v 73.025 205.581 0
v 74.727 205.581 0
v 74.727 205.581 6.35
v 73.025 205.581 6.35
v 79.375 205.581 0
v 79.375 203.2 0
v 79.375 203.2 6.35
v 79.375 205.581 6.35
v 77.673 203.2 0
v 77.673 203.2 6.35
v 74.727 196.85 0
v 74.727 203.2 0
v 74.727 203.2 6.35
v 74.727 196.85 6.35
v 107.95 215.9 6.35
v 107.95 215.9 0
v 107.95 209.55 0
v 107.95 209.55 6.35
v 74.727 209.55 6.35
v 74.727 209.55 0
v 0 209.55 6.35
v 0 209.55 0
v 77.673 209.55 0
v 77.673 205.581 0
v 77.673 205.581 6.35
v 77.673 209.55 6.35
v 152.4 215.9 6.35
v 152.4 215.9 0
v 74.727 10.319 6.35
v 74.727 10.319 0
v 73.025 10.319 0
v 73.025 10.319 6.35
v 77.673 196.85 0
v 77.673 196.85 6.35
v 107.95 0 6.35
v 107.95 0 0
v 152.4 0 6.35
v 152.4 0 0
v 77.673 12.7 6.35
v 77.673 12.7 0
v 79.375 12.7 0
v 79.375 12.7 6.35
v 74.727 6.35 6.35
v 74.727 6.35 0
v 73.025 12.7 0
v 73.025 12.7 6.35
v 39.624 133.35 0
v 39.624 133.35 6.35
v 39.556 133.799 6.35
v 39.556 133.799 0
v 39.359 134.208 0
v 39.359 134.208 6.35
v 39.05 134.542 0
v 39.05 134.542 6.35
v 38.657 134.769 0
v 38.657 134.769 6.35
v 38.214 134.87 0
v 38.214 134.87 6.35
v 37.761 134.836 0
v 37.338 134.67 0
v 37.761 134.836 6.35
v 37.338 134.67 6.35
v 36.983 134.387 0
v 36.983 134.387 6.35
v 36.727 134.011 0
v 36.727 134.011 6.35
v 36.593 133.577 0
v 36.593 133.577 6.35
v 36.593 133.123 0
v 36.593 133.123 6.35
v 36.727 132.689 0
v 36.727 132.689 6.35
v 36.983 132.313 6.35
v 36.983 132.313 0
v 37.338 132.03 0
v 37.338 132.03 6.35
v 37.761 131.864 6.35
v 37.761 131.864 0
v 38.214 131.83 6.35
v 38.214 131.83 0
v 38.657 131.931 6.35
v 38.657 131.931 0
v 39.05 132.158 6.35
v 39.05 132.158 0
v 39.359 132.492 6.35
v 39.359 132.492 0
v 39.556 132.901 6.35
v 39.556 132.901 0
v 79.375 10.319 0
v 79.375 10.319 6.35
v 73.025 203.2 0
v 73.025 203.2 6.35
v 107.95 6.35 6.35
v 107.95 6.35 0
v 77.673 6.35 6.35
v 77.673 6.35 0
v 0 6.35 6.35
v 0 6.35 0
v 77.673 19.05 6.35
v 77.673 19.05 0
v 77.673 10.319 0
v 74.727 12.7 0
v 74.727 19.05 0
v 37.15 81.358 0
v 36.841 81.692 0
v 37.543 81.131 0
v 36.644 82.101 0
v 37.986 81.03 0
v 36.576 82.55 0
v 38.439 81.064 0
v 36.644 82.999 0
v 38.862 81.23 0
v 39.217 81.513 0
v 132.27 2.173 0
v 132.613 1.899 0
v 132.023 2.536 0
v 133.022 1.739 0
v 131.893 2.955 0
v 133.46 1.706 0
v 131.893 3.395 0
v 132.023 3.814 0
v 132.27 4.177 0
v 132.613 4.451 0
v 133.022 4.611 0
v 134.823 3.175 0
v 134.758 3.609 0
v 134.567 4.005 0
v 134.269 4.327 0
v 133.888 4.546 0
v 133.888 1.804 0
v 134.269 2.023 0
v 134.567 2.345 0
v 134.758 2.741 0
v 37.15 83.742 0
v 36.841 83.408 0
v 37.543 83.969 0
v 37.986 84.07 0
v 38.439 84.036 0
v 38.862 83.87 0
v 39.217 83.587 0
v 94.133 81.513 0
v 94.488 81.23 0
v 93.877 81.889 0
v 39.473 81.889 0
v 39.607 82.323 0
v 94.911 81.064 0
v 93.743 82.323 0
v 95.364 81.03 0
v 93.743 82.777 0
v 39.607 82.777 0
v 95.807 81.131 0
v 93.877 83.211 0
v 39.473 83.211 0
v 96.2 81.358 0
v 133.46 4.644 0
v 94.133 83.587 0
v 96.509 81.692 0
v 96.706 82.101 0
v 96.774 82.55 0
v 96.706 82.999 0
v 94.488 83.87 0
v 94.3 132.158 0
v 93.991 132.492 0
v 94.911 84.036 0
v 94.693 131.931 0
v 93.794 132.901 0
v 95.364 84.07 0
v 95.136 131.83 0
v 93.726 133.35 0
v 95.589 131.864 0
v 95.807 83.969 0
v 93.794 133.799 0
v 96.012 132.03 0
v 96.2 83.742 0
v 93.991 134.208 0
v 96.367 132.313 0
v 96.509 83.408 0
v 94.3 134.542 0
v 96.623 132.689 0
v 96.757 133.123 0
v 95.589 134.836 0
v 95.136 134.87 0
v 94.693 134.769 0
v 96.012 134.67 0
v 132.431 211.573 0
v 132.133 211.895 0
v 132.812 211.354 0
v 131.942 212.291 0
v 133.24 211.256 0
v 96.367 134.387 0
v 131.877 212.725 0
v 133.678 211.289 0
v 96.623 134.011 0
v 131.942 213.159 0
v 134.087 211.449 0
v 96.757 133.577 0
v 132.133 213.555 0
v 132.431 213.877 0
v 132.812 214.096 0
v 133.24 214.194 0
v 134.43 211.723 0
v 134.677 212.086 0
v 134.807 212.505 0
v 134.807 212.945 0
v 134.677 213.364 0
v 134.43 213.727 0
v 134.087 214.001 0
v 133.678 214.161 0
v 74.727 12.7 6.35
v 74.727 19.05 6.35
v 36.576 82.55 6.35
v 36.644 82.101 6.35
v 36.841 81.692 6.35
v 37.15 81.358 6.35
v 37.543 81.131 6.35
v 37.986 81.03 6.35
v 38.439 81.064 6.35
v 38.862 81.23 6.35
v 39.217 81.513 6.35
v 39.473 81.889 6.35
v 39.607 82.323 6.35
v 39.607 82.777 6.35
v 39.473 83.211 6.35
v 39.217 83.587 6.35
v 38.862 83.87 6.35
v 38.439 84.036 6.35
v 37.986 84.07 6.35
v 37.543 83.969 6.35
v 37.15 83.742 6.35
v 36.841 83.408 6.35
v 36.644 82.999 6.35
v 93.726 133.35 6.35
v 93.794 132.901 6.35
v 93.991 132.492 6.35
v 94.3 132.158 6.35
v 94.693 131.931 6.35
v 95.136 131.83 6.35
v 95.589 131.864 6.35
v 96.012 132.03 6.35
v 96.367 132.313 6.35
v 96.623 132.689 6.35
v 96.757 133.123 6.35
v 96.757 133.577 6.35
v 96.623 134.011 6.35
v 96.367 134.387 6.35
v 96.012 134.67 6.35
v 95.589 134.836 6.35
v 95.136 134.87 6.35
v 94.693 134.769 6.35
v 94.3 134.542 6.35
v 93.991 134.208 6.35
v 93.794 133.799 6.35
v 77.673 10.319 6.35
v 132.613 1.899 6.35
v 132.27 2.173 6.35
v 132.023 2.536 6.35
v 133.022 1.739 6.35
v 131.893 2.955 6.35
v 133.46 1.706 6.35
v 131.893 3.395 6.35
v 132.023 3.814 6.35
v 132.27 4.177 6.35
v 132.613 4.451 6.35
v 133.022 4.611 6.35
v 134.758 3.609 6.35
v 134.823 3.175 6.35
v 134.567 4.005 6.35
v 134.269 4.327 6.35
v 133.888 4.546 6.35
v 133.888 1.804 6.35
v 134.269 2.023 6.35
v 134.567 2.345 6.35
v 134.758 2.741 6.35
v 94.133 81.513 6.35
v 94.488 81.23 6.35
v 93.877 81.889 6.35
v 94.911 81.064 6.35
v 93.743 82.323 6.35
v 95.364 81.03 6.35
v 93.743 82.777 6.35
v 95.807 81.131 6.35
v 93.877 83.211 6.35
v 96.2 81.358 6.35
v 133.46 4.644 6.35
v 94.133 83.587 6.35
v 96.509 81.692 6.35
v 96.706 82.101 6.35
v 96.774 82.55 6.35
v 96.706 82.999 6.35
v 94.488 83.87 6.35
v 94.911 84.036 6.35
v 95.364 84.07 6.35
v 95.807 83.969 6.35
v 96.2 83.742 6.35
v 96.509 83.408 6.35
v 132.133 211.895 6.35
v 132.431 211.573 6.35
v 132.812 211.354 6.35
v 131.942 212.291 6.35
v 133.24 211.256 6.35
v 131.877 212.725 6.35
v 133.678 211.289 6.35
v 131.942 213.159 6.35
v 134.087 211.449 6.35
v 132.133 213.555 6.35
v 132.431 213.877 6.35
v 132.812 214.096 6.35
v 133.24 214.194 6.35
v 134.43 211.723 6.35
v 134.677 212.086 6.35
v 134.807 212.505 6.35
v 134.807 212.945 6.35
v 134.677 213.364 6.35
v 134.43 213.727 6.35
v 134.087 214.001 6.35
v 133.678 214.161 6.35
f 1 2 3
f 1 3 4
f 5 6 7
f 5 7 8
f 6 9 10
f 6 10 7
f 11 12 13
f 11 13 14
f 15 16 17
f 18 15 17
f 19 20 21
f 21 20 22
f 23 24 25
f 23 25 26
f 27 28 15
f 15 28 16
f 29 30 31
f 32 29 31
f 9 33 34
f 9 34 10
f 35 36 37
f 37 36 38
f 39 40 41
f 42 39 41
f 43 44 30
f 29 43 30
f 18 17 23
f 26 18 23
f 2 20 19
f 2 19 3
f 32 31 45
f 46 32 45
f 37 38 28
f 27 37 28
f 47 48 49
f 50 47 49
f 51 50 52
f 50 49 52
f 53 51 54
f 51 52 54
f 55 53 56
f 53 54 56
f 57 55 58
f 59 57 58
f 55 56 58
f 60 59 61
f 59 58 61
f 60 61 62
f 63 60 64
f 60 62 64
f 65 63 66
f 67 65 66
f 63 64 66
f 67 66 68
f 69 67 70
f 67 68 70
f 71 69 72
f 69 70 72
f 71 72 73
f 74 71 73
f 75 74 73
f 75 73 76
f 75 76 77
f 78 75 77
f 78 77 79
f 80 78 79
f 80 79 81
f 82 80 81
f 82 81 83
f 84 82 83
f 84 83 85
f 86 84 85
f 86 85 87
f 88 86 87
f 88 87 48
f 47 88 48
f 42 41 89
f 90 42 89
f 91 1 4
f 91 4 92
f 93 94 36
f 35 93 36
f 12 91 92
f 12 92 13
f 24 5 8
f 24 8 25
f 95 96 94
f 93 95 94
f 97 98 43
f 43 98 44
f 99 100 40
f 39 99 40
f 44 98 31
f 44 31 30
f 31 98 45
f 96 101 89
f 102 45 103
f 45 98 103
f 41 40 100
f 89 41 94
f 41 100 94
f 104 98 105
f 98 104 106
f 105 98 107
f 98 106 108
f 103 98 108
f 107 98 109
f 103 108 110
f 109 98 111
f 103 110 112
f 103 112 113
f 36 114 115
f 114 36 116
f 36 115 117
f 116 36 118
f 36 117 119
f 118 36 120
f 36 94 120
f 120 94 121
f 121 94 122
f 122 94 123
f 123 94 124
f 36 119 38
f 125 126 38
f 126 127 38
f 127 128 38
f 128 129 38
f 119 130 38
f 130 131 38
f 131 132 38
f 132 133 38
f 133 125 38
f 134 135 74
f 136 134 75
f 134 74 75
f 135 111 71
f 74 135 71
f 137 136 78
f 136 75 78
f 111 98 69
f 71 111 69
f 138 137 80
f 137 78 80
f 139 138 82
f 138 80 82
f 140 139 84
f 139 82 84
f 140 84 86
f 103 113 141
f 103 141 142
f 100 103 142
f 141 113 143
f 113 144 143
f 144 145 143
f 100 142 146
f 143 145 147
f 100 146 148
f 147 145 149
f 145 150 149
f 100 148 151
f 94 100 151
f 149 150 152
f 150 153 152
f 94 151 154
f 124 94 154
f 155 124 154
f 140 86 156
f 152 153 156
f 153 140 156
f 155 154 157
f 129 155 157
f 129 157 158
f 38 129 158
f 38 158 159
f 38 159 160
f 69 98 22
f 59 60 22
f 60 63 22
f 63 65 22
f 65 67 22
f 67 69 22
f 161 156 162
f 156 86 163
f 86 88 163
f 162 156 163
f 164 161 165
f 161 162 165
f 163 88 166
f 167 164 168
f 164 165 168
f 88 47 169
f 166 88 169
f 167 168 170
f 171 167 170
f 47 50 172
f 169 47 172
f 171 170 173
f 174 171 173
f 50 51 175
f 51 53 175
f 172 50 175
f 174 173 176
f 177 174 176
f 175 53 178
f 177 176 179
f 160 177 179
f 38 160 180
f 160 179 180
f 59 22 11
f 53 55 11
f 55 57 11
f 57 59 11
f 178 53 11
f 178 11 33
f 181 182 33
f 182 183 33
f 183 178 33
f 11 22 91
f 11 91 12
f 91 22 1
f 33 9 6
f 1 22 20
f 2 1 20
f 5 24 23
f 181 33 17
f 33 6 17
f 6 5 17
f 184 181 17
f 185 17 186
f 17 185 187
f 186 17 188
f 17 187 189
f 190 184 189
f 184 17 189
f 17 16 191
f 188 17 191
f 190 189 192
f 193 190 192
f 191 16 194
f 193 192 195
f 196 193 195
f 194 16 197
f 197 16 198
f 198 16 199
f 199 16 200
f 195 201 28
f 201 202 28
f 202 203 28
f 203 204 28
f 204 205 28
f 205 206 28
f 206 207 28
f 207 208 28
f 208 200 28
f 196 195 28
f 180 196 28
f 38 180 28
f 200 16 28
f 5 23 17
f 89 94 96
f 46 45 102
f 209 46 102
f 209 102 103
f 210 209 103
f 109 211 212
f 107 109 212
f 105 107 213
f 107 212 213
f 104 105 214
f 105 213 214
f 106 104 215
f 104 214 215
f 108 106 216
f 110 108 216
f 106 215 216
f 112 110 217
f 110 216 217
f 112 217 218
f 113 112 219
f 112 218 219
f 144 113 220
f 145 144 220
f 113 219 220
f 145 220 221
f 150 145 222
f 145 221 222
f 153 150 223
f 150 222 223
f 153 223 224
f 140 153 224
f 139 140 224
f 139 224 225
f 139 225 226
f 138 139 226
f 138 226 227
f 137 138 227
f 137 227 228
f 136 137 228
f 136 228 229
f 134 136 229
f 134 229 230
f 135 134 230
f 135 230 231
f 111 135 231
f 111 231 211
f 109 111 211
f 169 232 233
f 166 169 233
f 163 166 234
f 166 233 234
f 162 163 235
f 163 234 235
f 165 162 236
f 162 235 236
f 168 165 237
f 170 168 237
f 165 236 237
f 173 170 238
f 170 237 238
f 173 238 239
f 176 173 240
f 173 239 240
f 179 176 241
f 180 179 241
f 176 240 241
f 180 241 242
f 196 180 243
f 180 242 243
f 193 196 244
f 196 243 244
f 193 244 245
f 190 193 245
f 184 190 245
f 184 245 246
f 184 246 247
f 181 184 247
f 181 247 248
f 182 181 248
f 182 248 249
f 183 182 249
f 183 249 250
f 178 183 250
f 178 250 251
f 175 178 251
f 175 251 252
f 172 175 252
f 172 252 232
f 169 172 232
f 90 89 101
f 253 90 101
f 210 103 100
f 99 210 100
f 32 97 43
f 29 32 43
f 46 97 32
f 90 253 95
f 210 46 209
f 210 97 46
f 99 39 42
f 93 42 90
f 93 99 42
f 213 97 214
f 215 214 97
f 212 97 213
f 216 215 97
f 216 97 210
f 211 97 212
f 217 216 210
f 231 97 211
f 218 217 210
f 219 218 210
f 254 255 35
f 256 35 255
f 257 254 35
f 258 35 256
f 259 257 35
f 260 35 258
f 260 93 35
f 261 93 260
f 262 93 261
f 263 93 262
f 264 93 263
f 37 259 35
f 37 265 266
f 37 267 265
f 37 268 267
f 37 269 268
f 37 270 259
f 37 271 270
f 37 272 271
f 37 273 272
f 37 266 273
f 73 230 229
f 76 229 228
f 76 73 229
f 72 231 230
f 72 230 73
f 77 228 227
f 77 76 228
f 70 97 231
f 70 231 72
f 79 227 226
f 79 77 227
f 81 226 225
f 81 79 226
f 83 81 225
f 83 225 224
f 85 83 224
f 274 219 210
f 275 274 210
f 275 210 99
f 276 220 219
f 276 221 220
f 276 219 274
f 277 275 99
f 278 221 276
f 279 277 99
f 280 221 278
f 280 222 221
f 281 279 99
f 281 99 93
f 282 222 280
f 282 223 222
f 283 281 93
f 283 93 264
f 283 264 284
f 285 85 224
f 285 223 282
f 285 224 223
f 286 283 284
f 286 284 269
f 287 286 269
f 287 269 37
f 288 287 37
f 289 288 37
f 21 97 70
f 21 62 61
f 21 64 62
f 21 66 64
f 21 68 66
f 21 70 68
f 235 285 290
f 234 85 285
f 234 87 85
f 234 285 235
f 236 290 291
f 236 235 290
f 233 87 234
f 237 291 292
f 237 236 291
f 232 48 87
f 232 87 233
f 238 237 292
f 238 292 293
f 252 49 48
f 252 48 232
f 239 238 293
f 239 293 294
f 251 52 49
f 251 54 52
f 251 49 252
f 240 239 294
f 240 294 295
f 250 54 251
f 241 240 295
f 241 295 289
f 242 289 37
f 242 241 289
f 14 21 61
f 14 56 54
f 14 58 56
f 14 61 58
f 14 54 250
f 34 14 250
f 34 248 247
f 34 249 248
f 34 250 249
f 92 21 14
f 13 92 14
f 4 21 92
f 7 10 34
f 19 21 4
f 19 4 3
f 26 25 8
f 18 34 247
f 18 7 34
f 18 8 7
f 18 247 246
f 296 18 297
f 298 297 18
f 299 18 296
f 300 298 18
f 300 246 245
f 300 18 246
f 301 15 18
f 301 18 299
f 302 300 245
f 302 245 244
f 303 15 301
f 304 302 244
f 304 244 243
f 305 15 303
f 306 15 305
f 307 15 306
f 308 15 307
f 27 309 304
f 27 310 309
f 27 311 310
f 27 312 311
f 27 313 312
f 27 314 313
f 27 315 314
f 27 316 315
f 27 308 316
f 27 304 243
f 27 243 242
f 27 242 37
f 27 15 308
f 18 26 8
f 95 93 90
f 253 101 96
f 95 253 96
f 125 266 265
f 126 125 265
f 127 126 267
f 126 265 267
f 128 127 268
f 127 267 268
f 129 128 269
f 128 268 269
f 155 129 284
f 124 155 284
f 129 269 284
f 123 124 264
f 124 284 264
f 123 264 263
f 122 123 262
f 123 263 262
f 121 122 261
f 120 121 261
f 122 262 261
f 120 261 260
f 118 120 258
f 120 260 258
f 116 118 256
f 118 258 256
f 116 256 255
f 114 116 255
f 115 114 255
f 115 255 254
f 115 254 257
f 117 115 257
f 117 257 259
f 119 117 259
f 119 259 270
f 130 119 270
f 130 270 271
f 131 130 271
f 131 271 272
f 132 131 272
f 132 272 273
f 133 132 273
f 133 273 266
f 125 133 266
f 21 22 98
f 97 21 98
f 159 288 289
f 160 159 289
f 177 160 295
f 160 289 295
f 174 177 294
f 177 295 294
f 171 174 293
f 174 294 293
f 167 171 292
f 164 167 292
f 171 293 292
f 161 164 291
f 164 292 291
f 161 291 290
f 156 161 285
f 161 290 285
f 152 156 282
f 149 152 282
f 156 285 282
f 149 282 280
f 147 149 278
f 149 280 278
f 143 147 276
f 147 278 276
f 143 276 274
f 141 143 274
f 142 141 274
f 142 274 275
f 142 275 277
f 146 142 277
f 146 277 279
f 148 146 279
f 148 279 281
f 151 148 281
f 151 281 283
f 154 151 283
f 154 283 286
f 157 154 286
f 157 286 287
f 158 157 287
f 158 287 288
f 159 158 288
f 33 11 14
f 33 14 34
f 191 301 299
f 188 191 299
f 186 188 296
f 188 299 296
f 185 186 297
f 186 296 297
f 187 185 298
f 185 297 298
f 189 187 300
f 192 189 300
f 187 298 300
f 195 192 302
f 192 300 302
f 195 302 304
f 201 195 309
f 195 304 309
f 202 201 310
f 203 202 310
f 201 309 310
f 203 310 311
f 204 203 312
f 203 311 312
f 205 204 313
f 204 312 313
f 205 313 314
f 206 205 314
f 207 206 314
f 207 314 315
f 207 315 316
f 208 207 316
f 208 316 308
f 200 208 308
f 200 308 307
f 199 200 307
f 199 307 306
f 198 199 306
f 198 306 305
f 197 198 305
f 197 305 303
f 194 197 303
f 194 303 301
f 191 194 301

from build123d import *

# Parameters (mm, degrees)
BOSS_EXTRUDE1_DEPTH = 6.35
SKETCH2_R           = 1.4732
CUT_EXTRUDE1_DEPTH  = 265.346160366
SKETCH4_R           = 1.524
CUT_EXTRUDE2_DEPTH  = 265.346160366
SKETCH5_R           = 1.524
CUT_EXTRUDE3_DEPTH  = 265.346160366
CUT_EXTRUDE10_DEPTH = 265.346160366


with BuildPart() as part:
    # Sketch1 → Boss-Extrude1 (new body)
    with BuildSketch(Plane.XY):
        Polygon((107.95, 215.9), (107.95, 209.55), (0, 209.55), (0, 6.35), (107.95, 6.35), (107.95, 0), (152.4, 0), (152.4, 215.9), align=None)
    extrude(amount=BOSS_EXTRUDE1_DEPTH)

    # Sketch2 → Cut-Extrude1 (cut, through all)
    with BuildSketch(Plane.XY.offset(6.35)):
        with Locations(Location((133.35, 212.725, 0), (0, 0, 180))):
            Circle(SKETCH2_R)
        with Locations((133.35, 3.175)):
            Circle(SKETCH2_R)
    extrude(amount=-CUT_EXTRUDE1_DEPTH, mode=Mode.SUBTRACT)

    # Sketch4 → Cut-Extrude2 (cut, through all)
    with BuildSketch(Plane.XY.offset(6.35)):
        with Locations(Location((95.25, 133.35, 0), (0, 0, 180))):
            Circle(SKETCH4_R)
        with Locations((95.25, 82.55)):
            Circle(SKETCH4_R)
    extrude(amount=-CUT_EXTRUDE2_DEPTH, mode=Mode.SUBTRACT)

    # Sketch5 → Cut-Extrude3 (cut, through all)
    with BuildSketch(Plane.XY.offset(6.35)):
        with Locations((38.1, 133.35)):
            Circle(SKETCH5_R)
        with Locations(Location((38.1, 82.55, 0), (0, 0, 180))):
            Circle(SKETCH5_R)
    extrude(amount=-CUT_EXTRUDE3_DEPTH, mode=Mode.SUBTRACT)

    # Sketch10 → Cut-Extrude10 (cut, through all)
    with BuildSketch(Plane(origin=(0, 0, 0), x_dir=(-1, 0, 0), z_dir=(0, 0, -1))):
        Polygon((-77.6732, 6.35), (-74.7268, 6.35), (-74.7268, 10.31875), (-73.025, 10.31875), (-73.025, 12.7), (-74.7268, 12.7), (-74.7268, 19.05), (-77.6732, 19.05), (-77.6732, 12.7), (-79.375, 12.7), (-79.375, 10.31875), (-77.6732, 10.31875), align=None)
        Polygon((-73.025, 205.58125), (-73.025, 203.2), (-74.7268, 203.2), (-74.7268, 196.85), (-77.6732, 196.85), (-77.6732, 203.2), (-79.375, 203.2), (-79.375, 205.58125), (-77.6732, 205.58125), (-77.6732, 209.55), (-74.7268, 209.55), (-74.7268, 205.58125), align=None)
    extrude(amount=-CUT_EXTRUDE10_DEPTH, mode=Mode.SUBTRACT)


solid = part.part
